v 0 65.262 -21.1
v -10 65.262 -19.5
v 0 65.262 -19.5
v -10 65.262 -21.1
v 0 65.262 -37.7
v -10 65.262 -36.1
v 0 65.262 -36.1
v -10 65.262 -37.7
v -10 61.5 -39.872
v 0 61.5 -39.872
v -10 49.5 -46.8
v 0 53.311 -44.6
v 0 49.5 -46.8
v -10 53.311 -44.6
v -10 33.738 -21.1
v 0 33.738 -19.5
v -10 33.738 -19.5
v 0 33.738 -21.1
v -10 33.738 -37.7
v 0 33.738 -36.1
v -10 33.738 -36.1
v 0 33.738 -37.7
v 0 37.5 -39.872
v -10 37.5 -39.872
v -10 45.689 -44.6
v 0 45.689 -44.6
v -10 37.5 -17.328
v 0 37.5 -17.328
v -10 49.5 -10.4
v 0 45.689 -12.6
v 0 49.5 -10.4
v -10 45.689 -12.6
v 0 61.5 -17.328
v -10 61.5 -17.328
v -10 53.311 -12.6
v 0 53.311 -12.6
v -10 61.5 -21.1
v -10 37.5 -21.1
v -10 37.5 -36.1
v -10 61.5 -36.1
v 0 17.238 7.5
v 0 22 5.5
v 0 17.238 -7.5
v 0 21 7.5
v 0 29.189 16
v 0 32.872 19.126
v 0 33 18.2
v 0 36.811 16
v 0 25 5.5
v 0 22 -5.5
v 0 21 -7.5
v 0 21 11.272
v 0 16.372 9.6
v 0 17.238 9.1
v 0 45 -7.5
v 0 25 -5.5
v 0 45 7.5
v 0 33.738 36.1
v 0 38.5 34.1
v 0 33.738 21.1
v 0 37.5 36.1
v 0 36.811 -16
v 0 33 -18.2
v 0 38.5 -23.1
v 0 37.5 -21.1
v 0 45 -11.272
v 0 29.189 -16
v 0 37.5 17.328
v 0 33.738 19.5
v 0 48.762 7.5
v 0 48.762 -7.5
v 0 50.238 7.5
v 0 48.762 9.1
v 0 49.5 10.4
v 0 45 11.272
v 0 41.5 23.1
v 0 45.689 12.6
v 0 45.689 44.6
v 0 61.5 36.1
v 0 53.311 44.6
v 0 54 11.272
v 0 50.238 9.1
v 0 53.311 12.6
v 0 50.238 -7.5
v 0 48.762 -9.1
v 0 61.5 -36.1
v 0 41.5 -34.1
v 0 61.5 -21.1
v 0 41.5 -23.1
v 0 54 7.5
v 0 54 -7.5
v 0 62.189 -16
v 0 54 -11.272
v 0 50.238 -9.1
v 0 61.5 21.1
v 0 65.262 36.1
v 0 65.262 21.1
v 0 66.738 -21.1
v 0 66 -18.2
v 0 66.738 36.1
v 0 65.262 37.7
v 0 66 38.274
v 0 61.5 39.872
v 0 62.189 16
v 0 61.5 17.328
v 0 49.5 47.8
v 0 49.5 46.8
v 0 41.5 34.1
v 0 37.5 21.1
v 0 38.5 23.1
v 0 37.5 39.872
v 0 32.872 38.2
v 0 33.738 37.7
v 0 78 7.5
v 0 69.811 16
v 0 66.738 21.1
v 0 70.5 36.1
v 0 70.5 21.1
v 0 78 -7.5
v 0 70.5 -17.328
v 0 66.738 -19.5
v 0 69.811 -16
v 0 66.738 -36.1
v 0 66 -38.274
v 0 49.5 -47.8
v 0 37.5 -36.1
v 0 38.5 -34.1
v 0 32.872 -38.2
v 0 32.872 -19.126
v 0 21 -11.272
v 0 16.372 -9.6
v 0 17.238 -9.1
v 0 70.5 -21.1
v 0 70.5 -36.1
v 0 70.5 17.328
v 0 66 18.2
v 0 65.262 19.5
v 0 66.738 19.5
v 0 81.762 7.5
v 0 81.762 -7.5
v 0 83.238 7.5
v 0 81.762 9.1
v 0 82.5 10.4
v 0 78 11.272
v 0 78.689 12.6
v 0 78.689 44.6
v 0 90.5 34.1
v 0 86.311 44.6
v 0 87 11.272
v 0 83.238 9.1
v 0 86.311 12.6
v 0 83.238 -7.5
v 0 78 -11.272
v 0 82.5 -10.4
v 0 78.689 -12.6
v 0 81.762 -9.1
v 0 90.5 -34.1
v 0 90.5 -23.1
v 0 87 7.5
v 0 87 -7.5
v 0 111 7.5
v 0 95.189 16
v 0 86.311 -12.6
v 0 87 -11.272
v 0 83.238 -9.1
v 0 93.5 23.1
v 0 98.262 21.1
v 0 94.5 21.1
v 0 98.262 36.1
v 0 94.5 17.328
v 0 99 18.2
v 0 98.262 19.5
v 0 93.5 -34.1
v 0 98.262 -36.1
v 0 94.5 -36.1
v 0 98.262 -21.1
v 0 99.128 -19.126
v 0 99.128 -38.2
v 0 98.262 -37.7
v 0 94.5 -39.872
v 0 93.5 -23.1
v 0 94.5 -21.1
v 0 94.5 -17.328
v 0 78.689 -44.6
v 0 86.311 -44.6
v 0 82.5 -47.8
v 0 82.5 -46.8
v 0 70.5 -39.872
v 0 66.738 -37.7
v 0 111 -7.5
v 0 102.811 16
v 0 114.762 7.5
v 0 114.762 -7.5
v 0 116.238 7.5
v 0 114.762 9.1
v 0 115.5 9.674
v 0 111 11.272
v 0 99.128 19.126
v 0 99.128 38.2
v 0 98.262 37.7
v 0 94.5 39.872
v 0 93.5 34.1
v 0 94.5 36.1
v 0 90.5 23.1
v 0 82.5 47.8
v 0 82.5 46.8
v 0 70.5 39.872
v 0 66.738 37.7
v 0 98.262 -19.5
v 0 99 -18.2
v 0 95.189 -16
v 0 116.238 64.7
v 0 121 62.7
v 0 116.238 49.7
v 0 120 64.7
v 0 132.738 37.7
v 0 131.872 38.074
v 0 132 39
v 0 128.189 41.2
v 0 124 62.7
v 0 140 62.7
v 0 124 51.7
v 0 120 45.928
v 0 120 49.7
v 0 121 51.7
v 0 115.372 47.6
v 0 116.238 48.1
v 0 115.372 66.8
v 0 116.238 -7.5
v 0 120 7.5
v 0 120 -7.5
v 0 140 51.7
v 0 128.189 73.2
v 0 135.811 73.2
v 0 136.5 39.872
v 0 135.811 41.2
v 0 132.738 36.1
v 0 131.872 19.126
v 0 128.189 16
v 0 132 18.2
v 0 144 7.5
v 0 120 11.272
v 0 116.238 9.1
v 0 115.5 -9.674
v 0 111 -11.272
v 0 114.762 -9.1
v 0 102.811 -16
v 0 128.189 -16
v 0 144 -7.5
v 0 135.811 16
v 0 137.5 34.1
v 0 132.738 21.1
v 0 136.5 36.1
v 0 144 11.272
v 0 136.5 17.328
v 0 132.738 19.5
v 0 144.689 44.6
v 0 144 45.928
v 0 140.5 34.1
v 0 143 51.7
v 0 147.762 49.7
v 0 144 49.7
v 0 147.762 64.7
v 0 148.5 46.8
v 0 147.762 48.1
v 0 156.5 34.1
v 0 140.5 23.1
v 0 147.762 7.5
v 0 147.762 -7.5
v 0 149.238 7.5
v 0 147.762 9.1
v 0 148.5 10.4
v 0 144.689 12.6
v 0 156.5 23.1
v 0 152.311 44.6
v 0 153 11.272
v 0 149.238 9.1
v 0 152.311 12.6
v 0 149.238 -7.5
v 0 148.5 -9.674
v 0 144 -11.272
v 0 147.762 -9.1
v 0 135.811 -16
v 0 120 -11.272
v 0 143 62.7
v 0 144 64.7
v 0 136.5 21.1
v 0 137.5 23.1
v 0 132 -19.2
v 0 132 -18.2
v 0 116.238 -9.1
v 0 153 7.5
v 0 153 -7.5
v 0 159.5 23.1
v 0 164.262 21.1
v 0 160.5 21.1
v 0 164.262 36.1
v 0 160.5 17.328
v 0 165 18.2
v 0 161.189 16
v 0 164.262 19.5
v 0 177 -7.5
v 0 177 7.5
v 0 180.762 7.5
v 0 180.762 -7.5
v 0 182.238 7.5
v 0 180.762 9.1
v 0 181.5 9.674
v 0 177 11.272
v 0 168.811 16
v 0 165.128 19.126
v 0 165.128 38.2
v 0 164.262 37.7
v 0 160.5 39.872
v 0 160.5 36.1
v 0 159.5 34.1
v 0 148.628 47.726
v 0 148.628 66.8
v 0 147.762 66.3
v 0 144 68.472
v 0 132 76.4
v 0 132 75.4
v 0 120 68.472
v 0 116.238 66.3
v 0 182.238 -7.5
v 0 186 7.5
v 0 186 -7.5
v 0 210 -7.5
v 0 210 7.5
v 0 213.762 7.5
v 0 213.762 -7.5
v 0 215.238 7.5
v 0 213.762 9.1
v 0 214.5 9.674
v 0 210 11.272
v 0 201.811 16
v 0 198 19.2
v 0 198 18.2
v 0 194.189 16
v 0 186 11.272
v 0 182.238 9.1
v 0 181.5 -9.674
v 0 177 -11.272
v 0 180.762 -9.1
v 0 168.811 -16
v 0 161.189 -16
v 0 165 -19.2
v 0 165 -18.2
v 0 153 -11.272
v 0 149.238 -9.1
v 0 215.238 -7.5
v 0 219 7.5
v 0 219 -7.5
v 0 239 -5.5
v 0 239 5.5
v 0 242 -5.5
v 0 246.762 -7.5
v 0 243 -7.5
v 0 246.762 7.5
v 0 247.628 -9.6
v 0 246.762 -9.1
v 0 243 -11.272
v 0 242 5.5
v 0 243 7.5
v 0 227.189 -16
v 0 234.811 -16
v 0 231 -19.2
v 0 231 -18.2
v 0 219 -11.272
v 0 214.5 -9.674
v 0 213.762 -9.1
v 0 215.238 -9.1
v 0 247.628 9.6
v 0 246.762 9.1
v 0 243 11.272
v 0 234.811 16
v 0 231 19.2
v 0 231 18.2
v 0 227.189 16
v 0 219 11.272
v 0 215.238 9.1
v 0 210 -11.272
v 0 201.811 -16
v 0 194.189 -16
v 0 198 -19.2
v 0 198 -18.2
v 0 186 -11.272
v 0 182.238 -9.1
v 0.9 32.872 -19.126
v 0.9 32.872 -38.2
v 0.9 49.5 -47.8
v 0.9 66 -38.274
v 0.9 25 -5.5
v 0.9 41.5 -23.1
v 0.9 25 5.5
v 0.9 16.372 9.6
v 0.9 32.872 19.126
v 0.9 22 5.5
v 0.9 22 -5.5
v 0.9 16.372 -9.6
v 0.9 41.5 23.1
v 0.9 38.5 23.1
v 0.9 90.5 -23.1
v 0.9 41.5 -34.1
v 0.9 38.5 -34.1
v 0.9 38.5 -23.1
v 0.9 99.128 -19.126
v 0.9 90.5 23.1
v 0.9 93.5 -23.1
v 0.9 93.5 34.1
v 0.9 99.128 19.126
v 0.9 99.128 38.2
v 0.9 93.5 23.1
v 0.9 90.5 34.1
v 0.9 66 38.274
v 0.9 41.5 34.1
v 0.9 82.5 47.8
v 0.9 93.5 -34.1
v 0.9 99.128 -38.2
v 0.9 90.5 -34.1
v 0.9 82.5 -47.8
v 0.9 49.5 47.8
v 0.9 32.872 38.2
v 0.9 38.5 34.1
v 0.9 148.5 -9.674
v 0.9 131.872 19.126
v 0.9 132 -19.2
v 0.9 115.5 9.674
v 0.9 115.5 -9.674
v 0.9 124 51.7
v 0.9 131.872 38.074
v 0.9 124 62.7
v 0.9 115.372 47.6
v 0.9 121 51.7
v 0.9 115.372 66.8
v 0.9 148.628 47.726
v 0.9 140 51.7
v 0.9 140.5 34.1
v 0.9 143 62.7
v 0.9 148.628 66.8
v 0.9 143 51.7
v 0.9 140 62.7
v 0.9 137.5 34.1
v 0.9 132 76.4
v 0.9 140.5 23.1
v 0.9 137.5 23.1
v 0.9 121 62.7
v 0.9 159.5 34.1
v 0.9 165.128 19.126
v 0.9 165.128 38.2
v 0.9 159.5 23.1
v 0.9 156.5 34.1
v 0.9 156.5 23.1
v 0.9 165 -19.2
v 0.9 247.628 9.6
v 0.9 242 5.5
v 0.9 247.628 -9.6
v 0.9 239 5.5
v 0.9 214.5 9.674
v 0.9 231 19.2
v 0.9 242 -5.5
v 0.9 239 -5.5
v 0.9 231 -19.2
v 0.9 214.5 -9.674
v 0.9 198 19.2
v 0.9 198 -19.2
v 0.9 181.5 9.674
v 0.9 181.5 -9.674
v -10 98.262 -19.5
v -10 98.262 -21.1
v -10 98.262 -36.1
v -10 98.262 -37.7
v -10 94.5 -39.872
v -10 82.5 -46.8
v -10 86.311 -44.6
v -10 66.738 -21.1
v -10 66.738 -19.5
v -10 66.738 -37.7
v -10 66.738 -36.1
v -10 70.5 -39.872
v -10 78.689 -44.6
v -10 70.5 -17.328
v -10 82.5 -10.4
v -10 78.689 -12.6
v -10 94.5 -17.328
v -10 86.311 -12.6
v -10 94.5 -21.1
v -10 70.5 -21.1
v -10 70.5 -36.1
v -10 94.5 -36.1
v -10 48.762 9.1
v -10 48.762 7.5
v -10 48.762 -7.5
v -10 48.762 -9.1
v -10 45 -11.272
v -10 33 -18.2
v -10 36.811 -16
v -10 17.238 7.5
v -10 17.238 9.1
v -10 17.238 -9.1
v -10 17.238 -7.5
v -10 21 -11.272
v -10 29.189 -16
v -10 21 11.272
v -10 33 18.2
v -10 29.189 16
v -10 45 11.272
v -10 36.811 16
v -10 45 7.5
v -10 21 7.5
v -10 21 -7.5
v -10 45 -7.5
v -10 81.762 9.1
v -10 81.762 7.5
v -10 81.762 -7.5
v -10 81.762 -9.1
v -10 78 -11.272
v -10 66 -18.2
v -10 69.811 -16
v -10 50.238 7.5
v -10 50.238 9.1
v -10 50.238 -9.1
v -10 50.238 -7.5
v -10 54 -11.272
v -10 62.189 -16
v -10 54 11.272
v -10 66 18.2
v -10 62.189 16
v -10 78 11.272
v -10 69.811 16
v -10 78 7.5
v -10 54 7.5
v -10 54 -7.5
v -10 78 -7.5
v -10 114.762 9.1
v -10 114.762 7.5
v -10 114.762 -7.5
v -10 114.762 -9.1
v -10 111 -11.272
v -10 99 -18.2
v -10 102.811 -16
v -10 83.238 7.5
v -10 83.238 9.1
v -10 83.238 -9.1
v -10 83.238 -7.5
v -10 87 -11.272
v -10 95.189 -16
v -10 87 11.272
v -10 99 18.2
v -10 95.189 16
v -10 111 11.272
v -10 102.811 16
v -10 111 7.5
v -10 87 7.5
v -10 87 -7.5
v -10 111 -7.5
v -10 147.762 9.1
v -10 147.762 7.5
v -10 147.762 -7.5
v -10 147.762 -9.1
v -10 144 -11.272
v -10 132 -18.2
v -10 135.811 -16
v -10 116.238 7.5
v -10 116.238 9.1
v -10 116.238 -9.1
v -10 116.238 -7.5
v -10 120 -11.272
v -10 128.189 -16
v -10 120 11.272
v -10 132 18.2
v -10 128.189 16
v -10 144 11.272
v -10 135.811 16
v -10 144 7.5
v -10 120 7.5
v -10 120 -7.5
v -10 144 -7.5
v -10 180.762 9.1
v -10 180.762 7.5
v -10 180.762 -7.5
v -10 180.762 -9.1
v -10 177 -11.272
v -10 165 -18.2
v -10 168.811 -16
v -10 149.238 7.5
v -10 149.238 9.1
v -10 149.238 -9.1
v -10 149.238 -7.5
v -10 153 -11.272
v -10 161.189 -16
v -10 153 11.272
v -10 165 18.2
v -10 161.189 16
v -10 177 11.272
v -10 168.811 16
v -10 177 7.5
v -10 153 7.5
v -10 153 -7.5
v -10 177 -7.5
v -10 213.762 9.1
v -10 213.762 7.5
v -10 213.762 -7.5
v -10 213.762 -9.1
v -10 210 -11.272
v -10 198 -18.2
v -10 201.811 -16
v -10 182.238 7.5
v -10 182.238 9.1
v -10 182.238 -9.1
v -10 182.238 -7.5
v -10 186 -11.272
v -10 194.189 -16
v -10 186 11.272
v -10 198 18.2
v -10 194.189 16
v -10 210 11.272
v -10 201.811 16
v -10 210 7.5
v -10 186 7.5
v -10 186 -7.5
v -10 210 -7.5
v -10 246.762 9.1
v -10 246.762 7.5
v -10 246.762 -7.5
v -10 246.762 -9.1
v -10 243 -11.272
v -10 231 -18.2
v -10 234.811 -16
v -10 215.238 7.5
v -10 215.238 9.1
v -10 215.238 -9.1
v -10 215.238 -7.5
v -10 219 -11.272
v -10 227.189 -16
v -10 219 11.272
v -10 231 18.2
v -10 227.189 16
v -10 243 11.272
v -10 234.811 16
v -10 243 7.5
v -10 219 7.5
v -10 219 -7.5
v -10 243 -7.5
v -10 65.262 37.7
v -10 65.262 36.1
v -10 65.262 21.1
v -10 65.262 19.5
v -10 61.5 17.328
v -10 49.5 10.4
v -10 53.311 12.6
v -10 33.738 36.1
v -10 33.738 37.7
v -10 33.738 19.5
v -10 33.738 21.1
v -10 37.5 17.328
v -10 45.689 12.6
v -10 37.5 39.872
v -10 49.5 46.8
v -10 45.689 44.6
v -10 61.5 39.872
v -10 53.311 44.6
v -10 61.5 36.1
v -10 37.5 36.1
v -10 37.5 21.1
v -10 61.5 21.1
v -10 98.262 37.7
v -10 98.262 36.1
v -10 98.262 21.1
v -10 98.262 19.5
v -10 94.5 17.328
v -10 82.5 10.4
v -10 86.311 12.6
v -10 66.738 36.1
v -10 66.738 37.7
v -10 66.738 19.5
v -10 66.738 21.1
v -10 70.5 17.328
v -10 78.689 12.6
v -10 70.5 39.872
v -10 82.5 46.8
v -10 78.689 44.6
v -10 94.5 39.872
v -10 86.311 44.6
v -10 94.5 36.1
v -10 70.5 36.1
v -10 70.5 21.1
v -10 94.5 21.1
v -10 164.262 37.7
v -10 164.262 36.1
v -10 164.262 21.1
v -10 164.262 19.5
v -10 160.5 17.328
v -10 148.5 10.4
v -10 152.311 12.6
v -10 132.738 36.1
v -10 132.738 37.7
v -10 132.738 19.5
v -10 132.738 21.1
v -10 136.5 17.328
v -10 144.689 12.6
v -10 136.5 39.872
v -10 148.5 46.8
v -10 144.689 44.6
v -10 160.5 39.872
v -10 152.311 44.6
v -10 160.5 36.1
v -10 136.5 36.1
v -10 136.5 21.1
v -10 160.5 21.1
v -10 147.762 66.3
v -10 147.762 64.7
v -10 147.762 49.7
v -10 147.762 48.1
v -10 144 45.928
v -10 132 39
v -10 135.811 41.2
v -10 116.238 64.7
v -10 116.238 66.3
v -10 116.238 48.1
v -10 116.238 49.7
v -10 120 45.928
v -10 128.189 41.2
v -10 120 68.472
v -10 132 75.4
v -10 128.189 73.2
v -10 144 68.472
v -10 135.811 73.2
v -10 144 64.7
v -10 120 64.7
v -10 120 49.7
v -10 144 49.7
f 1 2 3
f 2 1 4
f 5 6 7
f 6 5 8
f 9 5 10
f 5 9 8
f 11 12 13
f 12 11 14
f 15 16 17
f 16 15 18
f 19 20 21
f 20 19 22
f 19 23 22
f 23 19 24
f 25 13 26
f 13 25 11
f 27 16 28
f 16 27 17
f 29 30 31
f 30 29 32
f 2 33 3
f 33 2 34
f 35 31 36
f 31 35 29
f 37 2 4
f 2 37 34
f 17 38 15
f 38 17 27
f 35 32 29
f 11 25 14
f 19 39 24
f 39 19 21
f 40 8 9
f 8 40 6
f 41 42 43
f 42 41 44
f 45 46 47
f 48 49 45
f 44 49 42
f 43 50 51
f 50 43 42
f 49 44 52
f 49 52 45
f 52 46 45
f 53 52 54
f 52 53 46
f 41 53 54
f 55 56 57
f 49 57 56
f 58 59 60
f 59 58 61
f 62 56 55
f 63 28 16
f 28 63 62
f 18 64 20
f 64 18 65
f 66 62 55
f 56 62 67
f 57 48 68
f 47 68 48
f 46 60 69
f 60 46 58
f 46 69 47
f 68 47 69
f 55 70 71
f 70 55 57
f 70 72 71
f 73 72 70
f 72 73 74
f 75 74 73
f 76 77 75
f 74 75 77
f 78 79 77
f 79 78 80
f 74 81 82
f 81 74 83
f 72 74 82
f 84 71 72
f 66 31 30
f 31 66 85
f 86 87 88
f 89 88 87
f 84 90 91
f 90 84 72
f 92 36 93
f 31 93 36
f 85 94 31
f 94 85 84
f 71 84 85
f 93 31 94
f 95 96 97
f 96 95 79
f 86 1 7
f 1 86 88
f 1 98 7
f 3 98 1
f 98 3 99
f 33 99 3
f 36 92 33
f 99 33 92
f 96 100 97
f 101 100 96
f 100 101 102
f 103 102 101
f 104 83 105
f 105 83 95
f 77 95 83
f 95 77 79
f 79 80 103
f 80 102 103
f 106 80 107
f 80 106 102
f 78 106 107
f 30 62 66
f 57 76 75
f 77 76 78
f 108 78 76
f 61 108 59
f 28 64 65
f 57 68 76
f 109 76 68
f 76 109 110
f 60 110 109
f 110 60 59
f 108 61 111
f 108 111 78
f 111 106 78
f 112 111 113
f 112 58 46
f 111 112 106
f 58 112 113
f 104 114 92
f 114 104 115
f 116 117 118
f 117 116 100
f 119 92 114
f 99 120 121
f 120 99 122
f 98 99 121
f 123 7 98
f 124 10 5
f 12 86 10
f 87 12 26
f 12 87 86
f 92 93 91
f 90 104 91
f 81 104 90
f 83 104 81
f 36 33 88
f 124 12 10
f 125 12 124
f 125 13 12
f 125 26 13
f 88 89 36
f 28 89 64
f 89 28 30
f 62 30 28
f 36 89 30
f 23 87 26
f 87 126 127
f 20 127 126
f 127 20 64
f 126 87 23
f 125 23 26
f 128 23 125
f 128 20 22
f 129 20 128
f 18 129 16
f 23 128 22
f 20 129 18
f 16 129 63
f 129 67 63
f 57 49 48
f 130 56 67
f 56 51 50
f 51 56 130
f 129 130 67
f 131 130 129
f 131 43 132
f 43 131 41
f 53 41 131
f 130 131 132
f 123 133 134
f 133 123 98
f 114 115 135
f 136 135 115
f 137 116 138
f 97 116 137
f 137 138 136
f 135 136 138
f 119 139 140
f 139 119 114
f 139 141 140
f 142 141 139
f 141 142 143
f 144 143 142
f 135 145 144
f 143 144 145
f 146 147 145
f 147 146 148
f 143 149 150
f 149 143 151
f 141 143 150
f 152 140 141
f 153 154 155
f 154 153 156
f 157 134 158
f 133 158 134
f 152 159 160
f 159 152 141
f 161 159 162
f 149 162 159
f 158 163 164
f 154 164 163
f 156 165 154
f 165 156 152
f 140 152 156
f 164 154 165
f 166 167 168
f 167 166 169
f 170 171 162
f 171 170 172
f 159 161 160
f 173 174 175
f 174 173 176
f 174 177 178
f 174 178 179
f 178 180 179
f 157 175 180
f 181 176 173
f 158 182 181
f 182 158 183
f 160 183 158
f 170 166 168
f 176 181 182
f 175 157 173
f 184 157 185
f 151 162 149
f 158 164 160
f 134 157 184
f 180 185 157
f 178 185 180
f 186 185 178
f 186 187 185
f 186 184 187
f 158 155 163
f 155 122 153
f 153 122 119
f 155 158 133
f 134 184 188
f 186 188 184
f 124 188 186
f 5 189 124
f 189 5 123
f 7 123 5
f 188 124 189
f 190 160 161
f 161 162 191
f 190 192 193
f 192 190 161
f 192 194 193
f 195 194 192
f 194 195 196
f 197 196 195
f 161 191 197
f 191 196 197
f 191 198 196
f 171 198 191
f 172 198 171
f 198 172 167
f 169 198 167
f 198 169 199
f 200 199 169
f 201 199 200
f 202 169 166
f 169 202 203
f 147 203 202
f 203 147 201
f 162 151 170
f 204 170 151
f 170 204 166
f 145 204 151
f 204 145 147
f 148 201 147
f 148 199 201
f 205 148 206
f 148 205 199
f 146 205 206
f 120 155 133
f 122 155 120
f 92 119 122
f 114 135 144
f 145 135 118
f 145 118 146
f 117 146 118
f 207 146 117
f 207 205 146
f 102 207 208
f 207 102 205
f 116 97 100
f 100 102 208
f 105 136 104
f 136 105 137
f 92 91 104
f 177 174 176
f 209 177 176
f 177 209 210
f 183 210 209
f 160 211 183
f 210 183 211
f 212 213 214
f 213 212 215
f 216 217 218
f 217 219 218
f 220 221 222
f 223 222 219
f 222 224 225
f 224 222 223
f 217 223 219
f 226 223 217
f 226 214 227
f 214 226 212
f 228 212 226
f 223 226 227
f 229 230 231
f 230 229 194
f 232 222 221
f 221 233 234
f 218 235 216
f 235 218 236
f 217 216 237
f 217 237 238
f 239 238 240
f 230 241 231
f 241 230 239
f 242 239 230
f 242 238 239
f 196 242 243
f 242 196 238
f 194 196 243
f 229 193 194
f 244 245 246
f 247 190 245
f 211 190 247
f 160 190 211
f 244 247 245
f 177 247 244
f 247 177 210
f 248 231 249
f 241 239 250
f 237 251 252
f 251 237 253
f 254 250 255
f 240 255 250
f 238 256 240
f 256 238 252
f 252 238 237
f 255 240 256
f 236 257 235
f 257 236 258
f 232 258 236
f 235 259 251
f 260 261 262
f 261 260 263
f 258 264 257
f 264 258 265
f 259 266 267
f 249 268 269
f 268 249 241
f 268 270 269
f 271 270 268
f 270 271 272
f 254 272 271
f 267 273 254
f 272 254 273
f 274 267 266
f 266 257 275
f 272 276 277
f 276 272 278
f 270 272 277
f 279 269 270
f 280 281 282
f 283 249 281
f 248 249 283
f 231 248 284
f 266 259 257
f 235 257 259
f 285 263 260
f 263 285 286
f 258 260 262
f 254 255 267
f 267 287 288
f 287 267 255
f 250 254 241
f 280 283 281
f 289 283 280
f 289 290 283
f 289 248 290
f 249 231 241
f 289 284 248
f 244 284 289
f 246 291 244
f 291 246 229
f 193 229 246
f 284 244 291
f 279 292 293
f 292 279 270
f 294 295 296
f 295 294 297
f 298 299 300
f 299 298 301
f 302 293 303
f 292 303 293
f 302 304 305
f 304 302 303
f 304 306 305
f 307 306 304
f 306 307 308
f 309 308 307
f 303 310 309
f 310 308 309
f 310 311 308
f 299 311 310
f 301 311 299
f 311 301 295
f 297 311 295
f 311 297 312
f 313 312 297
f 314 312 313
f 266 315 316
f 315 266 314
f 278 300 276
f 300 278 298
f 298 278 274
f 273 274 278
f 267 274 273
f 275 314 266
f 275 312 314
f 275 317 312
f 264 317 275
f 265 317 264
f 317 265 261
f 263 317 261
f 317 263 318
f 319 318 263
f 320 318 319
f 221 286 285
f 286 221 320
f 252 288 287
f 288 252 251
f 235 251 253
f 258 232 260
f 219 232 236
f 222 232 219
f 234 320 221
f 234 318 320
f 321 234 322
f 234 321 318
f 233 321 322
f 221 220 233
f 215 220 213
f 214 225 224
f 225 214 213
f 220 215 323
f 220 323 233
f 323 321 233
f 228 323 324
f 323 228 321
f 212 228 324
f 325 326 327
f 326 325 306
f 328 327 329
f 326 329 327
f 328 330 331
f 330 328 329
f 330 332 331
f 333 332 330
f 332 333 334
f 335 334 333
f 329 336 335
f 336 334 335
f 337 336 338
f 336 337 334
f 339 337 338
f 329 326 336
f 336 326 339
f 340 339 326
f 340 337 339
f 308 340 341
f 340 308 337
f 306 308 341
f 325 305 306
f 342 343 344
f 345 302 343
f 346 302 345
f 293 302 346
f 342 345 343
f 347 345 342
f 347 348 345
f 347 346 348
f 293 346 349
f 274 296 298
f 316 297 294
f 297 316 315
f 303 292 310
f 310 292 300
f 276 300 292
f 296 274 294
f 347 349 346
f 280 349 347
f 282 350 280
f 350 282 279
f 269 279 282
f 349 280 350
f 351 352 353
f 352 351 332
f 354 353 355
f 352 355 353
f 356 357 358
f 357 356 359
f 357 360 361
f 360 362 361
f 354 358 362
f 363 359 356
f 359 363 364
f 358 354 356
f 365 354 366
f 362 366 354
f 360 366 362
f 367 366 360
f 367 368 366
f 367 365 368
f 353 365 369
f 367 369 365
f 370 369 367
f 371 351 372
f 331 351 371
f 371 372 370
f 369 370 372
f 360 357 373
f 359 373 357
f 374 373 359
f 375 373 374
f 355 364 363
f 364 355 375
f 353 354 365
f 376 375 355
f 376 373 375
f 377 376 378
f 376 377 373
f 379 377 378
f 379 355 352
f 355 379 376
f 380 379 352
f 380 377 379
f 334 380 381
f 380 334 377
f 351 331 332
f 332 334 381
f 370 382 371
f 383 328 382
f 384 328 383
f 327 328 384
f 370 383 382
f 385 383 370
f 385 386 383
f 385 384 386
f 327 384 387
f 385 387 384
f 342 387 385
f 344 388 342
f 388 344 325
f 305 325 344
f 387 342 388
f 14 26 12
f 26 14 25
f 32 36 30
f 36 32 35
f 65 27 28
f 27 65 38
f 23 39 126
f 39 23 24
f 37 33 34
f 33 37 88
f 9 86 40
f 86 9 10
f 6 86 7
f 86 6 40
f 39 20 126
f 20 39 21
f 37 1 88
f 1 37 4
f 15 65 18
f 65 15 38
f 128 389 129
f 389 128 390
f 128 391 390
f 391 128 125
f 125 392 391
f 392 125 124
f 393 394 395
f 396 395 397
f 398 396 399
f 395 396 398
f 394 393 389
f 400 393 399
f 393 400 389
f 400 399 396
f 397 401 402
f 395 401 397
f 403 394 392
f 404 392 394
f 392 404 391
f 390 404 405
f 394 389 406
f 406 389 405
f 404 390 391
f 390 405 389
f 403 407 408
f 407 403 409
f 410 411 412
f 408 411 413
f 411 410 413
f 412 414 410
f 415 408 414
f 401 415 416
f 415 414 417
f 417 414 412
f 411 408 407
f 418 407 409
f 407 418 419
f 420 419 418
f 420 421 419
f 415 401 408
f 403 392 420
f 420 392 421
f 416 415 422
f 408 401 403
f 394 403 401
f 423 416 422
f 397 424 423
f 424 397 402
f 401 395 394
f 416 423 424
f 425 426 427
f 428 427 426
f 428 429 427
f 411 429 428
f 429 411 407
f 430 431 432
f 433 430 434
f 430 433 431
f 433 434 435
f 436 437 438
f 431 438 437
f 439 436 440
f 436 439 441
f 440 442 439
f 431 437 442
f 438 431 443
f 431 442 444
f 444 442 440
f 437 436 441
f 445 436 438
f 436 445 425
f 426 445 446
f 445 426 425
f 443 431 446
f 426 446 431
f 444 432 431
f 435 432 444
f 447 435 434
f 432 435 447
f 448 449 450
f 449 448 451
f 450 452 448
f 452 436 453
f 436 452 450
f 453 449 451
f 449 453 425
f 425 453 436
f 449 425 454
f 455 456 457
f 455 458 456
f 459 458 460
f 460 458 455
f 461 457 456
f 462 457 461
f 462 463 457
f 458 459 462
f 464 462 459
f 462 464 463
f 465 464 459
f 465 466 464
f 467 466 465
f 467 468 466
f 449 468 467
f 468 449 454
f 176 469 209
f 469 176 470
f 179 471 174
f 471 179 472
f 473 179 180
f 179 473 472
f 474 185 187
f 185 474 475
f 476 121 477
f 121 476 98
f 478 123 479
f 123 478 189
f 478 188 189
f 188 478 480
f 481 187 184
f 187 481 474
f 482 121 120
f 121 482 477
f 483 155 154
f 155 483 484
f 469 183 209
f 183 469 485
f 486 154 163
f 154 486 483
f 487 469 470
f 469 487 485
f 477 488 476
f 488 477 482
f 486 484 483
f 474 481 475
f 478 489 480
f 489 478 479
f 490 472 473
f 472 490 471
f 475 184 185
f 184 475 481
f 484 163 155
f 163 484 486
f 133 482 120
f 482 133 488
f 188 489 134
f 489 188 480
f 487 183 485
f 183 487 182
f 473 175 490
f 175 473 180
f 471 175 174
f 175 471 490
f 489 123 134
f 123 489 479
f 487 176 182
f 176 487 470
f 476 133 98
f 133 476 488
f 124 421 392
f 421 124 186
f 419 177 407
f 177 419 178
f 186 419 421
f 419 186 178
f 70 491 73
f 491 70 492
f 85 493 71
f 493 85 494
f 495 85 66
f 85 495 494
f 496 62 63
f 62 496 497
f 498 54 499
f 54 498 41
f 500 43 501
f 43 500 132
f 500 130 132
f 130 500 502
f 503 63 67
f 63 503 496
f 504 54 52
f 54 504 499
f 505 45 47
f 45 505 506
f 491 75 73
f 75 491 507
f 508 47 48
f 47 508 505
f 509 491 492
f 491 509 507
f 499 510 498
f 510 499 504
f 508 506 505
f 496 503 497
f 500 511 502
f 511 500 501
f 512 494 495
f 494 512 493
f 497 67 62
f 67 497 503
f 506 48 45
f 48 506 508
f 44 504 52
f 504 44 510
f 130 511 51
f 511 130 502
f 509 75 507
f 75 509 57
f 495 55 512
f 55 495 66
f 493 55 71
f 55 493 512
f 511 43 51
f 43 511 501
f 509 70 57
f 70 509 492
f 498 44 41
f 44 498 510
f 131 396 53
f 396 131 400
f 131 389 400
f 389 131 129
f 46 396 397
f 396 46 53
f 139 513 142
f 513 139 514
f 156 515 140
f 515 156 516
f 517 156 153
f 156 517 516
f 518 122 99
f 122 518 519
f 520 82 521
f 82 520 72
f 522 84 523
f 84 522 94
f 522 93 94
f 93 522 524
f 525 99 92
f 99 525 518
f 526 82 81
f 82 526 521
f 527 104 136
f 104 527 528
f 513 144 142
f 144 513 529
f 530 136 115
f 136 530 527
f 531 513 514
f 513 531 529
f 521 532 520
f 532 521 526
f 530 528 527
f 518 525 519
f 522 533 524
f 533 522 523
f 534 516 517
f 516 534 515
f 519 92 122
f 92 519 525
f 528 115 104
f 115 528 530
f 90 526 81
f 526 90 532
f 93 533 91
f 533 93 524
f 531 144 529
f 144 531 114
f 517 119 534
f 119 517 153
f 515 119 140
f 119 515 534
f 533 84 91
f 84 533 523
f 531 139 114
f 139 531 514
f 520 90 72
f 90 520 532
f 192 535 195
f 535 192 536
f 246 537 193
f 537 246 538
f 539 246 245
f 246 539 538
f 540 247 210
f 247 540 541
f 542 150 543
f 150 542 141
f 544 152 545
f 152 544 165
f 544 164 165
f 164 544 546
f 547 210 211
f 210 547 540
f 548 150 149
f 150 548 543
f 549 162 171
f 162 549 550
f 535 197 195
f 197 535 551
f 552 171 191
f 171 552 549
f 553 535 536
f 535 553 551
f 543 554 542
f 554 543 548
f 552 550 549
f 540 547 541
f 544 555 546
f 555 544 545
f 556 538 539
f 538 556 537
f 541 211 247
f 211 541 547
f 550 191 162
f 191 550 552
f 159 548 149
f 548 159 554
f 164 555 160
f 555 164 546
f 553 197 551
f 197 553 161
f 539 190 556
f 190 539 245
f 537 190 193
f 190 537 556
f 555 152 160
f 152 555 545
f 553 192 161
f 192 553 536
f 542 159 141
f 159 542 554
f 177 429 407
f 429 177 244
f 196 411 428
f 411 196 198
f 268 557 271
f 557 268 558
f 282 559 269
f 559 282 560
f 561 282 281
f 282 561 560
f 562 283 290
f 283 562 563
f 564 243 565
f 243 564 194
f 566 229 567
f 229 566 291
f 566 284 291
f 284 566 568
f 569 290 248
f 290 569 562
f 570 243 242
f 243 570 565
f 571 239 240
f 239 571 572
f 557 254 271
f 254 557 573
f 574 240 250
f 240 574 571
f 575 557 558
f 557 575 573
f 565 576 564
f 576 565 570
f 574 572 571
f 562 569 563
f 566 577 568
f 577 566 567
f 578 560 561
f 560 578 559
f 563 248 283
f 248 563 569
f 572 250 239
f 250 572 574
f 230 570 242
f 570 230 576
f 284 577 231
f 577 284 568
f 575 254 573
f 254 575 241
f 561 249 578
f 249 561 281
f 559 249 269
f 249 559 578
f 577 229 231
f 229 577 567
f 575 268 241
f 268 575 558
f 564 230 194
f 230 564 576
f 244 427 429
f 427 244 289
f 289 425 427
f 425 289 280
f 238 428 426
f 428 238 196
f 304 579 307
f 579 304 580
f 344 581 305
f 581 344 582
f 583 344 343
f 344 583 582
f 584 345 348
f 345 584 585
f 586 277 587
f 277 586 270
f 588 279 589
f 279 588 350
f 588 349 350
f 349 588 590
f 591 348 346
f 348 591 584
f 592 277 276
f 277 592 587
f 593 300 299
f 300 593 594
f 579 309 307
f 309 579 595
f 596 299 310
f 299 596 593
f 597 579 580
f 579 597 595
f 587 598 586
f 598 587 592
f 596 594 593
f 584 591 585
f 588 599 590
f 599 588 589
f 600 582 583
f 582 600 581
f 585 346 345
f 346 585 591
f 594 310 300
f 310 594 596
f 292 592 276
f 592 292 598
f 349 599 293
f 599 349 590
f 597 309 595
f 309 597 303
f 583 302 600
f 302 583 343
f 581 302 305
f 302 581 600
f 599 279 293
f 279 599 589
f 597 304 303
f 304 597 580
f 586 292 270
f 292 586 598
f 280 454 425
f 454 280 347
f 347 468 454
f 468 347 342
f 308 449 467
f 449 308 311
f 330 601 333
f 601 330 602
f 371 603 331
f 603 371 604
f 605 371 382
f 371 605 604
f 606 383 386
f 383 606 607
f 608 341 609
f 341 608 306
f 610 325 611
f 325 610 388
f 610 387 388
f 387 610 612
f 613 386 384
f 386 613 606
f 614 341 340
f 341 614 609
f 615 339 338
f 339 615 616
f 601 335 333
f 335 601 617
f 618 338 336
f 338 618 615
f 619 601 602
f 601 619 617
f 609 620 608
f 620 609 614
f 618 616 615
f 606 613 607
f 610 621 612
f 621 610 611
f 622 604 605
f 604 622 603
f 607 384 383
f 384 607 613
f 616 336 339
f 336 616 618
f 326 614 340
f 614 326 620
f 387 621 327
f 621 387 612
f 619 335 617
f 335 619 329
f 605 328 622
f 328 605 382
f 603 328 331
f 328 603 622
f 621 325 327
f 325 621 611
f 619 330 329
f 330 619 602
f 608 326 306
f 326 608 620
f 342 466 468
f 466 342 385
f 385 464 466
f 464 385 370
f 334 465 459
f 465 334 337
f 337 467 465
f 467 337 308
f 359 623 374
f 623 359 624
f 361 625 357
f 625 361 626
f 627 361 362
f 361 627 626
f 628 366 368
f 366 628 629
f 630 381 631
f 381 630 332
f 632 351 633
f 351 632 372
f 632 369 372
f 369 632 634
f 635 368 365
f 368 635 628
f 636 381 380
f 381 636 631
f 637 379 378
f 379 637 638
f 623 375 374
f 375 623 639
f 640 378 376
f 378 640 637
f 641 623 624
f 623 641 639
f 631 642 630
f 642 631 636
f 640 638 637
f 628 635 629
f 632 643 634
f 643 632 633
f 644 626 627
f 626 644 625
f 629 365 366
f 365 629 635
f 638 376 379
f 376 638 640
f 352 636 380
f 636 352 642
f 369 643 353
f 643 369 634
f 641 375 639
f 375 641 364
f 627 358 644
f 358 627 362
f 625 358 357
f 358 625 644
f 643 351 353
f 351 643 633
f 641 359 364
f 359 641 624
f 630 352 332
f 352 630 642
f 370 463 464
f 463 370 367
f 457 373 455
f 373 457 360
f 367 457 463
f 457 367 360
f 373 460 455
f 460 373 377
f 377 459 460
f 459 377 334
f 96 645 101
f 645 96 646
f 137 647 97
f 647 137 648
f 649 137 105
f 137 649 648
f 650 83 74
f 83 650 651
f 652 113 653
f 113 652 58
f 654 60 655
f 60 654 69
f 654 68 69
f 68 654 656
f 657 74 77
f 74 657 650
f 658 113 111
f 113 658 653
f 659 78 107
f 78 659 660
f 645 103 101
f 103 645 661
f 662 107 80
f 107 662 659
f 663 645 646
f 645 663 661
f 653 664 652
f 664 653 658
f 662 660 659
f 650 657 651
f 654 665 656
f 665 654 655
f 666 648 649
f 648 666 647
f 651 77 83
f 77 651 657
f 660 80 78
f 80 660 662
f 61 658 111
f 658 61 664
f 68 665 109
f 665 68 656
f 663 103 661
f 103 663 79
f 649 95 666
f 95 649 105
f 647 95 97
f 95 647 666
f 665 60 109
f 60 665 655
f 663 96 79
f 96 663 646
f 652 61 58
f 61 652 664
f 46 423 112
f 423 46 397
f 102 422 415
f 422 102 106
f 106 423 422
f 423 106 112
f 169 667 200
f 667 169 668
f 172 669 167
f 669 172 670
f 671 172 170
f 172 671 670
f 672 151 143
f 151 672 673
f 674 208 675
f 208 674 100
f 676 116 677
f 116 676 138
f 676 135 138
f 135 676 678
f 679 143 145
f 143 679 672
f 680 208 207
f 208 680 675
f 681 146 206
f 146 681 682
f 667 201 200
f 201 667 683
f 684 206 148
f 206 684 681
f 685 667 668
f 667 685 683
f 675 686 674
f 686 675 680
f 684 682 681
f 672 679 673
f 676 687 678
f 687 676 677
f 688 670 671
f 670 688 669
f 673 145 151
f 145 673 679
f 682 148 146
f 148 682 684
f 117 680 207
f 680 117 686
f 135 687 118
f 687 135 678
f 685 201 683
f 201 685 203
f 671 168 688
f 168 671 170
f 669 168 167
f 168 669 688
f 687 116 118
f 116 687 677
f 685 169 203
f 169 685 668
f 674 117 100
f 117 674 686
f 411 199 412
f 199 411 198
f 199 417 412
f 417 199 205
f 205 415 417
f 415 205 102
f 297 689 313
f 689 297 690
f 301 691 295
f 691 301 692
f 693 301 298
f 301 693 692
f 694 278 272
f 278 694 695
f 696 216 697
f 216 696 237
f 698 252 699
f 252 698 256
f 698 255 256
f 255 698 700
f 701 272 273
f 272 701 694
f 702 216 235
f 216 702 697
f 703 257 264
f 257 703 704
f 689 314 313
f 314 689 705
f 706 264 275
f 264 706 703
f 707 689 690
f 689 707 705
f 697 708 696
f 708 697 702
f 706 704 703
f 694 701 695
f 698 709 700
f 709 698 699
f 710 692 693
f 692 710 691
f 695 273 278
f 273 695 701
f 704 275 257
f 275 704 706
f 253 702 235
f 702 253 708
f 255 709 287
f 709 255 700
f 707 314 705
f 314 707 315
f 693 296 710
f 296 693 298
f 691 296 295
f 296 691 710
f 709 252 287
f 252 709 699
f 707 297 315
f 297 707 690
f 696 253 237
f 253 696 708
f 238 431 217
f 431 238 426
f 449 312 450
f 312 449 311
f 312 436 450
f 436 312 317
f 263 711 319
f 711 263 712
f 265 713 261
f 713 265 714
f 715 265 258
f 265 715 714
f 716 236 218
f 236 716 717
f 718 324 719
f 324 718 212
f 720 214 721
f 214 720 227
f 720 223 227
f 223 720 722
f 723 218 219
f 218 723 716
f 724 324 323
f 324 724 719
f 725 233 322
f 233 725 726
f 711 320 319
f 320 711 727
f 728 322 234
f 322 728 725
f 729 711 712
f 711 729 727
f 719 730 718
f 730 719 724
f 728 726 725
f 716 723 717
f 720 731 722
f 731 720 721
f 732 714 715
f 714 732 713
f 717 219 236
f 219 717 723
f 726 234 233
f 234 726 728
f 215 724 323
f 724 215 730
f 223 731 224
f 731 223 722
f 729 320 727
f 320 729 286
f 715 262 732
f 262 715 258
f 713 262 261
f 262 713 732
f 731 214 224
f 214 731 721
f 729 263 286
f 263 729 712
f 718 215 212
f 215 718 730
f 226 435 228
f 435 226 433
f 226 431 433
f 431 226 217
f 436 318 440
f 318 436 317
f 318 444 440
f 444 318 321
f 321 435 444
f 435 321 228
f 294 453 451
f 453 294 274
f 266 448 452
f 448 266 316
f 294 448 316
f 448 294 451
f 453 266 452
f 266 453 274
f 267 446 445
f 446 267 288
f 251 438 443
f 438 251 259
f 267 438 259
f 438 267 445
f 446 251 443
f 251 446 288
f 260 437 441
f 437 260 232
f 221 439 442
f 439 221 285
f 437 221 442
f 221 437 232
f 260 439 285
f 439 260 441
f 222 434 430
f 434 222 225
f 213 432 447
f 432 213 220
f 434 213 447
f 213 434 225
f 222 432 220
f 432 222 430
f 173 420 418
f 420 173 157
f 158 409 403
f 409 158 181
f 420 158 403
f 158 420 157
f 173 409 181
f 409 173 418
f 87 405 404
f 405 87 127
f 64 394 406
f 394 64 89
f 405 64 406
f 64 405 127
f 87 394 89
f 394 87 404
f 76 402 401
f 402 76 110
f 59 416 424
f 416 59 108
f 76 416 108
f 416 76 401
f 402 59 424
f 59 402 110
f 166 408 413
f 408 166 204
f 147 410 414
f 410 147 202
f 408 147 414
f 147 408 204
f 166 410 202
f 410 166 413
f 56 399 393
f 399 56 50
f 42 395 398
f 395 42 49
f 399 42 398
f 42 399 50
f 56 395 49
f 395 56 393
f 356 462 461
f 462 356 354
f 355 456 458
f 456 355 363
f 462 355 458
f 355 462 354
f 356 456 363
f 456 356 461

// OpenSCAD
$fn=200;

// radius for hex
br=18.8;

// height for hex
bh=10;
bhh=0.9;

// Distance between 2 hexes
dist=33;
offx=32;
offy=24;
board();
extra=1;
extrah=10;

hs=11;

module draw_flower() {
    draw_line(-1,2, 3);
    draw_line(0,1, 7);
    draw_line(1,1,2);

    draw_line(1,4, 4);
    draw_line(2,4, 4);
}

module draw_flower_holes() {
    draw_hole_left(1,4, 4);
    draw_hole_right(1,4, 4);
    draw_hole_left(2,4, 4);
    draw_hole_right(2,4, 4);
    draw_hole_left(-1,3, 3);
    draw_hole_right(-1,2, 2);
    
    draw_hole_right(1,1,1);
    draw_hole_left(1,2,2);
    draw_hole_right(0,1, 1);

    draw_hole_left(0,7, 7);

}

module draw_hole_left(j, start, end) {
    for ( i = [start : end] ){
            translate([-15,i*dist+(dist/2*(j%2))+8,j*28.6+hs/2]) rotate([0,90,0]) {
                cube([hs,3,30]);
            }
        }
    }
    
module draw_hole_right(j, start, end) {
    for ( i = [start : end] ){
            translate([-15,i*dist+(dist/2*(j%2))-8-3,j*28.6+hs/2]) rotate([0,90,0]) {
                cube([hs,3,30]);
            }
    }
}

module draw_line(j, start, end) {
    for ( i = [start : end] ){
        translate([0,i*dist+(dist/2*(j%2)),j*28.6]) rotate([0,90,0]) {
            cylinder(r=br+0.4,h=bhh, $fn=6);
            
            rotate([180,0,0]) difference() {
                cylinder(r=br-0.6,h=bh, $fn=6);
                translate([-offx/2,-offy/2,0]) cube([offx,offy,bh]);
                translate([-7.5,-33,0]) cube([15,100,bh]);
                
            }
        }
    }
}

module draw_line_extra(j, start, end, height, radius) {
    for ( i = [start : end] ){
        translate([0,i*dist+(dist/2*(j%2)),j*28.6]) rotate([0,90,0]) {
            cylinder(r=radius,h=height, $fn=6);
        }
    }
}

        

module board() {
    difference() {
        draw_flower();
        draw_flower_holes();
        
    }
}
